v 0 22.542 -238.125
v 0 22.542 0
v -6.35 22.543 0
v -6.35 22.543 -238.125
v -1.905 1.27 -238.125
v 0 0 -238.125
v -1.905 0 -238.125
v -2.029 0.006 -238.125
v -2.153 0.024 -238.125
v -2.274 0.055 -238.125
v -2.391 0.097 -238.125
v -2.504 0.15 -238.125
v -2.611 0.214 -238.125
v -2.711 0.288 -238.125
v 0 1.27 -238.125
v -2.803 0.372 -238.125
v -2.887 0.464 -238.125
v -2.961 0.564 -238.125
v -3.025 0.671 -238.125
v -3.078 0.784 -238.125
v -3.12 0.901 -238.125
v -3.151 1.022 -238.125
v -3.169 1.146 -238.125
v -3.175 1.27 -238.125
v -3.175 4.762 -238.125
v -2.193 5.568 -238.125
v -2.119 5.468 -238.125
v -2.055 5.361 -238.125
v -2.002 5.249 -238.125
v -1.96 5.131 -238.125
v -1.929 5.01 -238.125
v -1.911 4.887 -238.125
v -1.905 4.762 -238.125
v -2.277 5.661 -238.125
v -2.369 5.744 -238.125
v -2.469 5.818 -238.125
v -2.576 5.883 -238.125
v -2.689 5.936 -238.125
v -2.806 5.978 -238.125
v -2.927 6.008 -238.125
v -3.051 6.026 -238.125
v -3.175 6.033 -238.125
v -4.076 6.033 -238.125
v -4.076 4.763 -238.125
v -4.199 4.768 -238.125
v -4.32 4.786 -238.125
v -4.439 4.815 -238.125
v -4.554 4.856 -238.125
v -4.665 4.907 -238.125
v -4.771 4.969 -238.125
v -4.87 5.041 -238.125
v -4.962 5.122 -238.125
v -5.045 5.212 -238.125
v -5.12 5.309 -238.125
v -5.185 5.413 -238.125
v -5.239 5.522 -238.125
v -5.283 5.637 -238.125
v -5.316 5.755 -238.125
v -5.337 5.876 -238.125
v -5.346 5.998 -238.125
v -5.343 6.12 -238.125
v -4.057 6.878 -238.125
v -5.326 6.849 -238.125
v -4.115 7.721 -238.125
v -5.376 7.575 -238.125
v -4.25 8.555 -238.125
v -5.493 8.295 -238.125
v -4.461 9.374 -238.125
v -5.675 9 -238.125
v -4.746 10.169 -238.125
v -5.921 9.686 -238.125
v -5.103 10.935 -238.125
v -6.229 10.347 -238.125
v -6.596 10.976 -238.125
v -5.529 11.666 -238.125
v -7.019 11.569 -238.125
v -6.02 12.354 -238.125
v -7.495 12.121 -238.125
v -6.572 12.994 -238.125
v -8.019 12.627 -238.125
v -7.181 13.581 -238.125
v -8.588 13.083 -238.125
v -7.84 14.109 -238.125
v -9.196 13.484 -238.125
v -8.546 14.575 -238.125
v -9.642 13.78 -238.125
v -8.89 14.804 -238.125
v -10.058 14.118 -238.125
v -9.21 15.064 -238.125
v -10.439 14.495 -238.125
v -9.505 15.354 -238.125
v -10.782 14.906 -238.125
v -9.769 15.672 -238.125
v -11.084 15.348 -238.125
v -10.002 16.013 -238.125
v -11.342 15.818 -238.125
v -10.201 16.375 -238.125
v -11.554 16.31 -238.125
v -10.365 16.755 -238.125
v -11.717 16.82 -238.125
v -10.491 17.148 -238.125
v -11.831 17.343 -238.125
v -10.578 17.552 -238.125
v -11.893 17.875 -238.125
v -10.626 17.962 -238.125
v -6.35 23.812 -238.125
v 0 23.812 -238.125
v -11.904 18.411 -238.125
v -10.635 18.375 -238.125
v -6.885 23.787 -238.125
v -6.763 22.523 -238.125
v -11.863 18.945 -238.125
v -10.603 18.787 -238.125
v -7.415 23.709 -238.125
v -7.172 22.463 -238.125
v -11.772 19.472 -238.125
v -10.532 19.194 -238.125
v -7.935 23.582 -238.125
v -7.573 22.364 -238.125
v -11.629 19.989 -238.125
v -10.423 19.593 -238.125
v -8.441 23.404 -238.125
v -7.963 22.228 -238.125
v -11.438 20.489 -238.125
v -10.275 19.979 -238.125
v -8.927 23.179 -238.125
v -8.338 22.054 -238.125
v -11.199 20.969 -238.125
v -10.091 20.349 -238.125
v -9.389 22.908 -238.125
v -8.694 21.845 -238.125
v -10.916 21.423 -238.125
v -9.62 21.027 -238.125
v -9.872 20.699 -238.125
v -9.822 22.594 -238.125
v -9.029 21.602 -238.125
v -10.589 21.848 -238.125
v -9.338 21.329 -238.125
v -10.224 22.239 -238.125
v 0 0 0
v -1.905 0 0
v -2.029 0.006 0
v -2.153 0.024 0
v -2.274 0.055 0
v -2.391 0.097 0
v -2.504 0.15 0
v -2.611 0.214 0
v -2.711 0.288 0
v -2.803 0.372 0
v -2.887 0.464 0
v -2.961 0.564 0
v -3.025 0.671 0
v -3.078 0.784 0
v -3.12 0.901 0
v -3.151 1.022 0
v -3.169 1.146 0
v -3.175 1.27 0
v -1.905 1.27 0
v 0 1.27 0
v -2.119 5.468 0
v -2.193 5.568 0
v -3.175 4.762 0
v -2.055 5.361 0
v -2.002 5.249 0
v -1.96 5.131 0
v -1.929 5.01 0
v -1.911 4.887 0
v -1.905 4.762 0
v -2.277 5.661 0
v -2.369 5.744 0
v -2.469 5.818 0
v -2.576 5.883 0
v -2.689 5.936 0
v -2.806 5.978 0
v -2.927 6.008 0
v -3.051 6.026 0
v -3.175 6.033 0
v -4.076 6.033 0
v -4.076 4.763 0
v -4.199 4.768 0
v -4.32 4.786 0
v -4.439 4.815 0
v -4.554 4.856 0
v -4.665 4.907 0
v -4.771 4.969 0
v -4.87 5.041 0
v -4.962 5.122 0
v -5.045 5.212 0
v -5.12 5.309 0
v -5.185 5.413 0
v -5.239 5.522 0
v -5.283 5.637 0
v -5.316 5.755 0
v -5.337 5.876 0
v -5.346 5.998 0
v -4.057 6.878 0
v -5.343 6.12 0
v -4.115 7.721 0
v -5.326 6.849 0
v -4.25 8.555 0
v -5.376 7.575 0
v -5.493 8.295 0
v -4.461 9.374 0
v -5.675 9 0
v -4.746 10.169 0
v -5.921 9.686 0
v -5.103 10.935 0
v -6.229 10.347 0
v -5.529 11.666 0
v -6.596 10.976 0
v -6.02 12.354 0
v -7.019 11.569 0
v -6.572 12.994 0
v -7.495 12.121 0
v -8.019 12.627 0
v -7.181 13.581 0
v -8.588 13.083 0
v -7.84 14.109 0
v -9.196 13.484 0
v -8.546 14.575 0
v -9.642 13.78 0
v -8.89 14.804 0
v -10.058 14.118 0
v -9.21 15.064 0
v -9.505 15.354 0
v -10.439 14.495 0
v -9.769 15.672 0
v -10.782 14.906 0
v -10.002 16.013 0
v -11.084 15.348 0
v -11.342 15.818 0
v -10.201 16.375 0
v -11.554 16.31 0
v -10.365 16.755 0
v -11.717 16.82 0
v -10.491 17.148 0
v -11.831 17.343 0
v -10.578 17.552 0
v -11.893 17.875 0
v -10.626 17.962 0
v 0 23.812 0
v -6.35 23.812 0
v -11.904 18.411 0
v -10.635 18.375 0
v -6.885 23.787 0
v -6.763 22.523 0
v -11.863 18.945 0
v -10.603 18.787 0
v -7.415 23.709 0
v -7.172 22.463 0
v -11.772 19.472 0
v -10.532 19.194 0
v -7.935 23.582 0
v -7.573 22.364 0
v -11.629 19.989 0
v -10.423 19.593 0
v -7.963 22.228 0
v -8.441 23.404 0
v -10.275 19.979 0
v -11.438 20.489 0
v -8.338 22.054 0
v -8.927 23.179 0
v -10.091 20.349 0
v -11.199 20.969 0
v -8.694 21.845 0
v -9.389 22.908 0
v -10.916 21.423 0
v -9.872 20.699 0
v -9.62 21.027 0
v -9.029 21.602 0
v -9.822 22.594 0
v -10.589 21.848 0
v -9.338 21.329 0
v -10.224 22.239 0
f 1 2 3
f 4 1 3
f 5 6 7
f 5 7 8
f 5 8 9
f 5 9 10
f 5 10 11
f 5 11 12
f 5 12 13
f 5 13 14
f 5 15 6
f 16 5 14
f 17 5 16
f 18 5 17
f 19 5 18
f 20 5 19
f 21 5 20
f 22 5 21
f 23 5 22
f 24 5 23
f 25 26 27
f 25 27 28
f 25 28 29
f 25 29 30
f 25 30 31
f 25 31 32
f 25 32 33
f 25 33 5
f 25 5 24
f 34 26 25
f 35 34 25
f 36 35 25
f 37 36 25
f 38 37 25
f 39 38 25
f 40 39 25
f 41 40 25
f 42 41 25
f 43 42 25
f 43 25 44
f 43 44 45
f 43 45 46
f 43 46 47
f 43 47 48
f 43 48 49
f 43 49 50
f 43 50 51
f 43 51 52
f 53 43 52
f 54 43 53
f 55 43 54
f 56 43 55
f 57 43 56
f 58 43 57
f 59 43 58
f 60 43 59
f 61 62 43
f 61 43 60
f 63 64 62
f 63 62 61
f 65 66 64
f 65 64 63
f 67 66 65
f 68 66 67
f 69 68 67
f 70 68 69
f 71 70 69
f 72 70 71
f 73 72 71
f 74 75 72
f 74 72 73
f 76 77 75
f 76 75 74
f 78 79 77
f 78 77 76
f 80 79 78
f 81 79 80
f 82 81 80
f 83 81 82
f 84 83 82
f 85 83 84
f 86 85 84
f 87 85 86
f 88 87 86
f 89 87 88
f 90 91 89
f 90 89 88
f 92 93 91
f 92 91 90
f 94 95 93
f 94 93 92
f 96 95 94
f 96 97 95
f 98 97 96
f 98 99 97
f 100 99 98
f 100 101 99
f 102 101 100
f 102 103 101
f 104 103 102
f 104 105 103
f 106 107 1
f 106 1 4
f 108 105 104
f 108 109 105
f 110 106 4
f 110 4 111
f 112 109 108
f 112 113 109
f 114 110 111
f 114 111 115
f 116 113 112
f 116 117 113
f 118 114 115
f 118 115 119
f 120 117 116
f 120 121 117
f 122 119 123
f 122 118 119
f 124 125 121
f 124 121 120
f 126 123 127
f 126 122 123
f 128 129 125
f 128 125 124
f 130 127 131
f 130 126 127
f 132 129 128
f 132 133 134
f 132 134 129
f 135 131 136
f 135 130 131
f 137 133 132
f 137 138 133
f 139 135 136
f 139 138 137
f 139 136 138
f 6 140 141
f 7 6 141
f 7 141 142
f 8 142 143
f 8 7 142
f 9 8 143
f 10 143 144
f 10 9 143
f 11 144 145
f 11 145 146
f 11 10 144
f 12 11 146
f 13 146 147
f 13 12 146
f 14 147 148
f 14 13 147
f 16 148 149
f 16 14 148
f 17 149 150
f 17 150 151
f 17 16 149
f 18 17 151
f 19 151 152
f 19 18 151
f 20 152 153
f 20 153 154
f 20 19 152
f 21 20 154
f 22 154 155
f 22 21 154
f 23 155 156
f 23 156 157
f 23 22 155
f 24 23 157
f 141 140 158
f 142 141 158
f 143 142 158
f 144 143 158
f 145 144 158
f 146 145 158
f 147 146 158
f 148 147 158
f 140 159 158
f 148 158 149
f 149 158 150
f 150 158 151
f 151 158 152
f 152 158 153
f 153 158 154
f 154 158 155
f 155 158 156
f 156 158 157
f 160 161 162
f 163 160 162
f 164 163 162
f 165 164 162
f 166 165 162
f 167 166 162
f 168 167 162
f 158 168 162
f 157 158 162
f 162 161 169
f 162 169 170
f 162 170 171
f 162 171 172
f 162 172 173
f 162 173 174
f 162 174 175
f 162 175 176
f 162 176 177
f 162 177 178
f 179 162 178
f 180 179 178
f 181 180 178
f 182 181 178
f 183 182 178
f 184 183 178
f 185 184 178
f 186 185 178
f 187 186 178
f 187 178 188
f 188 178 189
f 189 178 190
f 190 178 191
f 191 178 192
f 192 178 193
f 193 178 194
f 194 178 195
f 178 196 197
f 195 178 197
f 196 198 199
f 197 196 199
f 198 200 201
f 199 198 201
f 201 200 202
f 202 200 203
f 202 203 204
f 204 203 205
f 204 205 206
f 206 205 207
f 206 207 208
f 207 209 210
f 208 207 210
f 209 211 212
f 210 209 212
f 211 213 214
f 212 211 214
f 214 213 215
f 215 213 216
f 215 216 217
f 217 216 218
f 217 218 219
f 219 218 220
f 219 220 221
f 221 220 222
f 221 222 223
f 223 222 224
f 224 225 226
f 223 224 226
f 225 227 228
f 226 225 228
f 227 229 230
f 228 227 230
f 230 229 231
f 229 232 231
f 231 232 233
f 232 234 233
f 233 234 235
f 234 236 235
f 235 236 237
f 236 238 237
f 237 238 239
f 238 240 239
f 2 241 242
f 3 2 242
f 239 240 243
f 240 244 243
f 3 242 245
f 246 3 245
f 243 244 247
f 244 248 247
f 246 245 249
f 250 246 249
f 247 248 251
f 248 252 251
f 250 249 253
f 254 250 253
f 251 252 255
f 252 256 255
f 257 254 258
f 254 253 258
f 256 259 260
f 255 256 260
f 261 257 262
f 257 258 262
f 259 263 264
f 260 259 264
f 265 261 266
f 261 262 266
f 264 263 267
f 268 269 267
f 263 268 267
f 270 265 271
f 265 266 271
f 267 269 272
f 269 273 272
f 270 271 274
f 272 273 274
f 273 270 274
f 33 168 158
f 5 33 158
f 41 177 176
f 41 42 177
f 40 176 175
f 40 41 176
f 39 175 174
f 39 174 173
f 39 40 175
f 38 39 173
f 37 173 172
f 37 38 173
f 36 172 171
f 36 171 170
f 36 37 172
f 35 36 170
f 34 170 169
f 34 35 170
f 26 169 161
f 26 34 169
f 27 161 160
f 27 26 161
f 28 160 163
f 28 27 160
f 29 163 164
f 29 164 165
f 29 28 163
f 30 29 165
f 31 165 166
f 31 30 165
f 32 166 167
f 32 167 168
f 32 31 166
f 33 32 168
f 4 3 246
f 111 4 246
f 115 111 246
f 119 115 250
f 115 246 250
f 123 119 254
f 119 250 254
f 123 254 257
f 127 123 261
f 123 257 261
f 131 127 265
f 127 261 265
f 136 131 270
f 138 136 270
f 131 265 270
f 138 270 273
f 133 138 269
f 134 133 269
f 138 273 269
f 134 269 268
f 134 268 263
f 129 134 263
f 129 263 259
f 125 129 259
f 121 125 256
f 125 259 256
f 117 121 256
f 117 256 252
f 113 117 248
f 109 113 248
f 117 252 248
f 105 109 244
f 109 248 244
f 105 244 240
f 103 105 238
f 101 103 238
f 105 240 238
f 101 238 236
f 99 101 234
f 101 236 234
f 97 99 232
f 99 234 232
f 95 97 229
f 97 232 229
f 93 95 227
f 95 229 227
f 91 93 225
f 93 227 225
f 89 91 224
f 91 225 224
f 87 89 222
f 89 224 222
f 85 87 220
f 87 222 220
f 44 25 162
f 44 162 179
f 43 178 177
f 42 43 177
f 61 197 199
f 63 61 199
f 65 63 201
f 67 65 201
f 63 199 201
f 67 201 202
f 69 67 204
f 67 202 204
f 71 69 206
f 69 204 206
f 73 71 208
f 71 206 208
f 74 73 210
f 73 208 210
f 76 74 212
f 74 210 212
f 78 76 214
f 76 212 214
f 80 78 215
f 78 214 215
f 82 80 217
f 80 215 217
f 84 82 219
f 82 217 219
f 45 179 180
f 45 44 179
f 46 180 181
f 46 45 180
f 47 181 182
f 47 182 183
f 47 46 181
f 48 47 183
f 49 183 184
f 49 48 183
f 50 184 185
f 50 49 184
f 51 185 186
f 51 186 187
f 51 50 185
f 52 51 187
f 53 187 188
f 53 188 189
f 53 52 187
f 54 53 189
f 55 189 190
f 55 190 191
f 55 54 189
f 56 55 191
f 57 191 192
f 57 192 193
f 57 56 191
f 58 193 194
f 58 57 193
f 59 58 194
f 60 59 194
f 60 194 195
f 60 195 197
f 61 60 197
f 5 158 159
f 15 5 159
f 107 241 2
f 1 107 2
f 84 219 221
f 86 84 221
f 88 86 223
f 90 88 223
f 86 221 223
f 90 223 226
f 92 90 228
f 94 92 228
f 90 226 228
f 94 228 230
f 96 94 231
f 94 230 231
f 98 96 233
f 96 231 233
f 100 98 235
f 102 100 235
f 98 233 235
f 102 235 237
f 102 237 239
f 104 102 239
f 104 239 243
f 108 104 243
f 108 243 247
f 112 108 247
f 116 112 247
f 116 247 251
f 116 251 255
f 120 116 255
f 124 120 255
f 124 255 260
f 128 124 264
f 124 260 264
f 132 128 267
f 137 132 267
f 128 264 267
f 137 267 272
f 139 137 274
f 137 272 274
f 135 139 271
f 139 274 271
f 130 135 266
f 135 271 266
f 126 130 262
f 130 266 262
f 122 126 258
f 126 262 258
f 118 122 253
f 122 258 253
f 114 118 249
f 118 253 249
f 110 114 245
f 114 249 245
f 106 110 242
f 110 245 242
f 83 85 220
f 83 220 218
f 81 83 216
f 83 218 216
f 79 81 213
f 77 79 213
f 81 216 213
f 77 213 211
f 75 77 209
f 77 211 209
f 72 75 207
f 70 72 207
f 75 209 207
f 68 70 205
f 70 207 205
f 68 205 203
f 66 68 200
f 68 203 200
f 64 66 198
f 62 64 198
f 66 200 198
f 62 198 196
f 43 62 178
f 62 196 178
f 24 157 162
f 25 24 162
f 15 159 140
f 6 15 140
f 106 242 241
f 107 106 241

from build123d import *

# Parameters (mm, degrees)
EXTRUDE_THIN1_DEPTH = 238.125
FILLET1_R           = 1.27


with BuildPart() as part:
    # Sketch1 → Extrude-Thin1 (new body)
    with BuildSketch(Plane.XY):
        with BuildLine():
            Line((0, 0), (-3.175, 0))
            Line((-3.175, 0), (-3.175, 4.7625))
            Line((-3.175, 4.7625), (-5.55625, 4.7625))
            ThreePointArc((-5.55625, 4.7625), (-5.936639641, 9.724124929), (-9.196056015, 13.484260978))
            ThreePointArc((-9.196056015, 13.484260978), (-11.70659771, 19.732317421), (-6.35, 23.8125))
            Line((-6.35, 23.8125), (0, 23.8125))
            Line((0, 23.8125), (0, 22.5425))
            Line((0, 22.5425), (-6.35, 22.5425))
            ThreePointArc((-6.35, 22.5425), (-10.48223252, 19.394930582), (-8.545528926, 14.575001326))
            ThreePointArc((-8.545528926, 14.575001326), (-5.103452481, 10.935459111), (-4.076247664, 6.0325))
            Line((-4.076247664, 6.0325), (-1.905, 6.0325))
            Line((-1.905, 6.0325), (-1.905, 1.27))
            Line((-1.905, 1.27), (0, 1.27))
            Line((0, 1.27), (0, 0))
        make_face()
    extrude(amount=-EXTRUDE_THIN1_DEPTH)

    # Fillet1
    fillet1_edges = [part.edges().sort_by_distance(p)[0] for p in [
        (-1.905, 6.0325, -119.0625),
        (-3.175, 0, -119.0625),
        (-5.55625, 4.7625, -119.0625),
    ]]
    fillet(fillet1_edges, radius=FILLET1_R)


solid = part.part
